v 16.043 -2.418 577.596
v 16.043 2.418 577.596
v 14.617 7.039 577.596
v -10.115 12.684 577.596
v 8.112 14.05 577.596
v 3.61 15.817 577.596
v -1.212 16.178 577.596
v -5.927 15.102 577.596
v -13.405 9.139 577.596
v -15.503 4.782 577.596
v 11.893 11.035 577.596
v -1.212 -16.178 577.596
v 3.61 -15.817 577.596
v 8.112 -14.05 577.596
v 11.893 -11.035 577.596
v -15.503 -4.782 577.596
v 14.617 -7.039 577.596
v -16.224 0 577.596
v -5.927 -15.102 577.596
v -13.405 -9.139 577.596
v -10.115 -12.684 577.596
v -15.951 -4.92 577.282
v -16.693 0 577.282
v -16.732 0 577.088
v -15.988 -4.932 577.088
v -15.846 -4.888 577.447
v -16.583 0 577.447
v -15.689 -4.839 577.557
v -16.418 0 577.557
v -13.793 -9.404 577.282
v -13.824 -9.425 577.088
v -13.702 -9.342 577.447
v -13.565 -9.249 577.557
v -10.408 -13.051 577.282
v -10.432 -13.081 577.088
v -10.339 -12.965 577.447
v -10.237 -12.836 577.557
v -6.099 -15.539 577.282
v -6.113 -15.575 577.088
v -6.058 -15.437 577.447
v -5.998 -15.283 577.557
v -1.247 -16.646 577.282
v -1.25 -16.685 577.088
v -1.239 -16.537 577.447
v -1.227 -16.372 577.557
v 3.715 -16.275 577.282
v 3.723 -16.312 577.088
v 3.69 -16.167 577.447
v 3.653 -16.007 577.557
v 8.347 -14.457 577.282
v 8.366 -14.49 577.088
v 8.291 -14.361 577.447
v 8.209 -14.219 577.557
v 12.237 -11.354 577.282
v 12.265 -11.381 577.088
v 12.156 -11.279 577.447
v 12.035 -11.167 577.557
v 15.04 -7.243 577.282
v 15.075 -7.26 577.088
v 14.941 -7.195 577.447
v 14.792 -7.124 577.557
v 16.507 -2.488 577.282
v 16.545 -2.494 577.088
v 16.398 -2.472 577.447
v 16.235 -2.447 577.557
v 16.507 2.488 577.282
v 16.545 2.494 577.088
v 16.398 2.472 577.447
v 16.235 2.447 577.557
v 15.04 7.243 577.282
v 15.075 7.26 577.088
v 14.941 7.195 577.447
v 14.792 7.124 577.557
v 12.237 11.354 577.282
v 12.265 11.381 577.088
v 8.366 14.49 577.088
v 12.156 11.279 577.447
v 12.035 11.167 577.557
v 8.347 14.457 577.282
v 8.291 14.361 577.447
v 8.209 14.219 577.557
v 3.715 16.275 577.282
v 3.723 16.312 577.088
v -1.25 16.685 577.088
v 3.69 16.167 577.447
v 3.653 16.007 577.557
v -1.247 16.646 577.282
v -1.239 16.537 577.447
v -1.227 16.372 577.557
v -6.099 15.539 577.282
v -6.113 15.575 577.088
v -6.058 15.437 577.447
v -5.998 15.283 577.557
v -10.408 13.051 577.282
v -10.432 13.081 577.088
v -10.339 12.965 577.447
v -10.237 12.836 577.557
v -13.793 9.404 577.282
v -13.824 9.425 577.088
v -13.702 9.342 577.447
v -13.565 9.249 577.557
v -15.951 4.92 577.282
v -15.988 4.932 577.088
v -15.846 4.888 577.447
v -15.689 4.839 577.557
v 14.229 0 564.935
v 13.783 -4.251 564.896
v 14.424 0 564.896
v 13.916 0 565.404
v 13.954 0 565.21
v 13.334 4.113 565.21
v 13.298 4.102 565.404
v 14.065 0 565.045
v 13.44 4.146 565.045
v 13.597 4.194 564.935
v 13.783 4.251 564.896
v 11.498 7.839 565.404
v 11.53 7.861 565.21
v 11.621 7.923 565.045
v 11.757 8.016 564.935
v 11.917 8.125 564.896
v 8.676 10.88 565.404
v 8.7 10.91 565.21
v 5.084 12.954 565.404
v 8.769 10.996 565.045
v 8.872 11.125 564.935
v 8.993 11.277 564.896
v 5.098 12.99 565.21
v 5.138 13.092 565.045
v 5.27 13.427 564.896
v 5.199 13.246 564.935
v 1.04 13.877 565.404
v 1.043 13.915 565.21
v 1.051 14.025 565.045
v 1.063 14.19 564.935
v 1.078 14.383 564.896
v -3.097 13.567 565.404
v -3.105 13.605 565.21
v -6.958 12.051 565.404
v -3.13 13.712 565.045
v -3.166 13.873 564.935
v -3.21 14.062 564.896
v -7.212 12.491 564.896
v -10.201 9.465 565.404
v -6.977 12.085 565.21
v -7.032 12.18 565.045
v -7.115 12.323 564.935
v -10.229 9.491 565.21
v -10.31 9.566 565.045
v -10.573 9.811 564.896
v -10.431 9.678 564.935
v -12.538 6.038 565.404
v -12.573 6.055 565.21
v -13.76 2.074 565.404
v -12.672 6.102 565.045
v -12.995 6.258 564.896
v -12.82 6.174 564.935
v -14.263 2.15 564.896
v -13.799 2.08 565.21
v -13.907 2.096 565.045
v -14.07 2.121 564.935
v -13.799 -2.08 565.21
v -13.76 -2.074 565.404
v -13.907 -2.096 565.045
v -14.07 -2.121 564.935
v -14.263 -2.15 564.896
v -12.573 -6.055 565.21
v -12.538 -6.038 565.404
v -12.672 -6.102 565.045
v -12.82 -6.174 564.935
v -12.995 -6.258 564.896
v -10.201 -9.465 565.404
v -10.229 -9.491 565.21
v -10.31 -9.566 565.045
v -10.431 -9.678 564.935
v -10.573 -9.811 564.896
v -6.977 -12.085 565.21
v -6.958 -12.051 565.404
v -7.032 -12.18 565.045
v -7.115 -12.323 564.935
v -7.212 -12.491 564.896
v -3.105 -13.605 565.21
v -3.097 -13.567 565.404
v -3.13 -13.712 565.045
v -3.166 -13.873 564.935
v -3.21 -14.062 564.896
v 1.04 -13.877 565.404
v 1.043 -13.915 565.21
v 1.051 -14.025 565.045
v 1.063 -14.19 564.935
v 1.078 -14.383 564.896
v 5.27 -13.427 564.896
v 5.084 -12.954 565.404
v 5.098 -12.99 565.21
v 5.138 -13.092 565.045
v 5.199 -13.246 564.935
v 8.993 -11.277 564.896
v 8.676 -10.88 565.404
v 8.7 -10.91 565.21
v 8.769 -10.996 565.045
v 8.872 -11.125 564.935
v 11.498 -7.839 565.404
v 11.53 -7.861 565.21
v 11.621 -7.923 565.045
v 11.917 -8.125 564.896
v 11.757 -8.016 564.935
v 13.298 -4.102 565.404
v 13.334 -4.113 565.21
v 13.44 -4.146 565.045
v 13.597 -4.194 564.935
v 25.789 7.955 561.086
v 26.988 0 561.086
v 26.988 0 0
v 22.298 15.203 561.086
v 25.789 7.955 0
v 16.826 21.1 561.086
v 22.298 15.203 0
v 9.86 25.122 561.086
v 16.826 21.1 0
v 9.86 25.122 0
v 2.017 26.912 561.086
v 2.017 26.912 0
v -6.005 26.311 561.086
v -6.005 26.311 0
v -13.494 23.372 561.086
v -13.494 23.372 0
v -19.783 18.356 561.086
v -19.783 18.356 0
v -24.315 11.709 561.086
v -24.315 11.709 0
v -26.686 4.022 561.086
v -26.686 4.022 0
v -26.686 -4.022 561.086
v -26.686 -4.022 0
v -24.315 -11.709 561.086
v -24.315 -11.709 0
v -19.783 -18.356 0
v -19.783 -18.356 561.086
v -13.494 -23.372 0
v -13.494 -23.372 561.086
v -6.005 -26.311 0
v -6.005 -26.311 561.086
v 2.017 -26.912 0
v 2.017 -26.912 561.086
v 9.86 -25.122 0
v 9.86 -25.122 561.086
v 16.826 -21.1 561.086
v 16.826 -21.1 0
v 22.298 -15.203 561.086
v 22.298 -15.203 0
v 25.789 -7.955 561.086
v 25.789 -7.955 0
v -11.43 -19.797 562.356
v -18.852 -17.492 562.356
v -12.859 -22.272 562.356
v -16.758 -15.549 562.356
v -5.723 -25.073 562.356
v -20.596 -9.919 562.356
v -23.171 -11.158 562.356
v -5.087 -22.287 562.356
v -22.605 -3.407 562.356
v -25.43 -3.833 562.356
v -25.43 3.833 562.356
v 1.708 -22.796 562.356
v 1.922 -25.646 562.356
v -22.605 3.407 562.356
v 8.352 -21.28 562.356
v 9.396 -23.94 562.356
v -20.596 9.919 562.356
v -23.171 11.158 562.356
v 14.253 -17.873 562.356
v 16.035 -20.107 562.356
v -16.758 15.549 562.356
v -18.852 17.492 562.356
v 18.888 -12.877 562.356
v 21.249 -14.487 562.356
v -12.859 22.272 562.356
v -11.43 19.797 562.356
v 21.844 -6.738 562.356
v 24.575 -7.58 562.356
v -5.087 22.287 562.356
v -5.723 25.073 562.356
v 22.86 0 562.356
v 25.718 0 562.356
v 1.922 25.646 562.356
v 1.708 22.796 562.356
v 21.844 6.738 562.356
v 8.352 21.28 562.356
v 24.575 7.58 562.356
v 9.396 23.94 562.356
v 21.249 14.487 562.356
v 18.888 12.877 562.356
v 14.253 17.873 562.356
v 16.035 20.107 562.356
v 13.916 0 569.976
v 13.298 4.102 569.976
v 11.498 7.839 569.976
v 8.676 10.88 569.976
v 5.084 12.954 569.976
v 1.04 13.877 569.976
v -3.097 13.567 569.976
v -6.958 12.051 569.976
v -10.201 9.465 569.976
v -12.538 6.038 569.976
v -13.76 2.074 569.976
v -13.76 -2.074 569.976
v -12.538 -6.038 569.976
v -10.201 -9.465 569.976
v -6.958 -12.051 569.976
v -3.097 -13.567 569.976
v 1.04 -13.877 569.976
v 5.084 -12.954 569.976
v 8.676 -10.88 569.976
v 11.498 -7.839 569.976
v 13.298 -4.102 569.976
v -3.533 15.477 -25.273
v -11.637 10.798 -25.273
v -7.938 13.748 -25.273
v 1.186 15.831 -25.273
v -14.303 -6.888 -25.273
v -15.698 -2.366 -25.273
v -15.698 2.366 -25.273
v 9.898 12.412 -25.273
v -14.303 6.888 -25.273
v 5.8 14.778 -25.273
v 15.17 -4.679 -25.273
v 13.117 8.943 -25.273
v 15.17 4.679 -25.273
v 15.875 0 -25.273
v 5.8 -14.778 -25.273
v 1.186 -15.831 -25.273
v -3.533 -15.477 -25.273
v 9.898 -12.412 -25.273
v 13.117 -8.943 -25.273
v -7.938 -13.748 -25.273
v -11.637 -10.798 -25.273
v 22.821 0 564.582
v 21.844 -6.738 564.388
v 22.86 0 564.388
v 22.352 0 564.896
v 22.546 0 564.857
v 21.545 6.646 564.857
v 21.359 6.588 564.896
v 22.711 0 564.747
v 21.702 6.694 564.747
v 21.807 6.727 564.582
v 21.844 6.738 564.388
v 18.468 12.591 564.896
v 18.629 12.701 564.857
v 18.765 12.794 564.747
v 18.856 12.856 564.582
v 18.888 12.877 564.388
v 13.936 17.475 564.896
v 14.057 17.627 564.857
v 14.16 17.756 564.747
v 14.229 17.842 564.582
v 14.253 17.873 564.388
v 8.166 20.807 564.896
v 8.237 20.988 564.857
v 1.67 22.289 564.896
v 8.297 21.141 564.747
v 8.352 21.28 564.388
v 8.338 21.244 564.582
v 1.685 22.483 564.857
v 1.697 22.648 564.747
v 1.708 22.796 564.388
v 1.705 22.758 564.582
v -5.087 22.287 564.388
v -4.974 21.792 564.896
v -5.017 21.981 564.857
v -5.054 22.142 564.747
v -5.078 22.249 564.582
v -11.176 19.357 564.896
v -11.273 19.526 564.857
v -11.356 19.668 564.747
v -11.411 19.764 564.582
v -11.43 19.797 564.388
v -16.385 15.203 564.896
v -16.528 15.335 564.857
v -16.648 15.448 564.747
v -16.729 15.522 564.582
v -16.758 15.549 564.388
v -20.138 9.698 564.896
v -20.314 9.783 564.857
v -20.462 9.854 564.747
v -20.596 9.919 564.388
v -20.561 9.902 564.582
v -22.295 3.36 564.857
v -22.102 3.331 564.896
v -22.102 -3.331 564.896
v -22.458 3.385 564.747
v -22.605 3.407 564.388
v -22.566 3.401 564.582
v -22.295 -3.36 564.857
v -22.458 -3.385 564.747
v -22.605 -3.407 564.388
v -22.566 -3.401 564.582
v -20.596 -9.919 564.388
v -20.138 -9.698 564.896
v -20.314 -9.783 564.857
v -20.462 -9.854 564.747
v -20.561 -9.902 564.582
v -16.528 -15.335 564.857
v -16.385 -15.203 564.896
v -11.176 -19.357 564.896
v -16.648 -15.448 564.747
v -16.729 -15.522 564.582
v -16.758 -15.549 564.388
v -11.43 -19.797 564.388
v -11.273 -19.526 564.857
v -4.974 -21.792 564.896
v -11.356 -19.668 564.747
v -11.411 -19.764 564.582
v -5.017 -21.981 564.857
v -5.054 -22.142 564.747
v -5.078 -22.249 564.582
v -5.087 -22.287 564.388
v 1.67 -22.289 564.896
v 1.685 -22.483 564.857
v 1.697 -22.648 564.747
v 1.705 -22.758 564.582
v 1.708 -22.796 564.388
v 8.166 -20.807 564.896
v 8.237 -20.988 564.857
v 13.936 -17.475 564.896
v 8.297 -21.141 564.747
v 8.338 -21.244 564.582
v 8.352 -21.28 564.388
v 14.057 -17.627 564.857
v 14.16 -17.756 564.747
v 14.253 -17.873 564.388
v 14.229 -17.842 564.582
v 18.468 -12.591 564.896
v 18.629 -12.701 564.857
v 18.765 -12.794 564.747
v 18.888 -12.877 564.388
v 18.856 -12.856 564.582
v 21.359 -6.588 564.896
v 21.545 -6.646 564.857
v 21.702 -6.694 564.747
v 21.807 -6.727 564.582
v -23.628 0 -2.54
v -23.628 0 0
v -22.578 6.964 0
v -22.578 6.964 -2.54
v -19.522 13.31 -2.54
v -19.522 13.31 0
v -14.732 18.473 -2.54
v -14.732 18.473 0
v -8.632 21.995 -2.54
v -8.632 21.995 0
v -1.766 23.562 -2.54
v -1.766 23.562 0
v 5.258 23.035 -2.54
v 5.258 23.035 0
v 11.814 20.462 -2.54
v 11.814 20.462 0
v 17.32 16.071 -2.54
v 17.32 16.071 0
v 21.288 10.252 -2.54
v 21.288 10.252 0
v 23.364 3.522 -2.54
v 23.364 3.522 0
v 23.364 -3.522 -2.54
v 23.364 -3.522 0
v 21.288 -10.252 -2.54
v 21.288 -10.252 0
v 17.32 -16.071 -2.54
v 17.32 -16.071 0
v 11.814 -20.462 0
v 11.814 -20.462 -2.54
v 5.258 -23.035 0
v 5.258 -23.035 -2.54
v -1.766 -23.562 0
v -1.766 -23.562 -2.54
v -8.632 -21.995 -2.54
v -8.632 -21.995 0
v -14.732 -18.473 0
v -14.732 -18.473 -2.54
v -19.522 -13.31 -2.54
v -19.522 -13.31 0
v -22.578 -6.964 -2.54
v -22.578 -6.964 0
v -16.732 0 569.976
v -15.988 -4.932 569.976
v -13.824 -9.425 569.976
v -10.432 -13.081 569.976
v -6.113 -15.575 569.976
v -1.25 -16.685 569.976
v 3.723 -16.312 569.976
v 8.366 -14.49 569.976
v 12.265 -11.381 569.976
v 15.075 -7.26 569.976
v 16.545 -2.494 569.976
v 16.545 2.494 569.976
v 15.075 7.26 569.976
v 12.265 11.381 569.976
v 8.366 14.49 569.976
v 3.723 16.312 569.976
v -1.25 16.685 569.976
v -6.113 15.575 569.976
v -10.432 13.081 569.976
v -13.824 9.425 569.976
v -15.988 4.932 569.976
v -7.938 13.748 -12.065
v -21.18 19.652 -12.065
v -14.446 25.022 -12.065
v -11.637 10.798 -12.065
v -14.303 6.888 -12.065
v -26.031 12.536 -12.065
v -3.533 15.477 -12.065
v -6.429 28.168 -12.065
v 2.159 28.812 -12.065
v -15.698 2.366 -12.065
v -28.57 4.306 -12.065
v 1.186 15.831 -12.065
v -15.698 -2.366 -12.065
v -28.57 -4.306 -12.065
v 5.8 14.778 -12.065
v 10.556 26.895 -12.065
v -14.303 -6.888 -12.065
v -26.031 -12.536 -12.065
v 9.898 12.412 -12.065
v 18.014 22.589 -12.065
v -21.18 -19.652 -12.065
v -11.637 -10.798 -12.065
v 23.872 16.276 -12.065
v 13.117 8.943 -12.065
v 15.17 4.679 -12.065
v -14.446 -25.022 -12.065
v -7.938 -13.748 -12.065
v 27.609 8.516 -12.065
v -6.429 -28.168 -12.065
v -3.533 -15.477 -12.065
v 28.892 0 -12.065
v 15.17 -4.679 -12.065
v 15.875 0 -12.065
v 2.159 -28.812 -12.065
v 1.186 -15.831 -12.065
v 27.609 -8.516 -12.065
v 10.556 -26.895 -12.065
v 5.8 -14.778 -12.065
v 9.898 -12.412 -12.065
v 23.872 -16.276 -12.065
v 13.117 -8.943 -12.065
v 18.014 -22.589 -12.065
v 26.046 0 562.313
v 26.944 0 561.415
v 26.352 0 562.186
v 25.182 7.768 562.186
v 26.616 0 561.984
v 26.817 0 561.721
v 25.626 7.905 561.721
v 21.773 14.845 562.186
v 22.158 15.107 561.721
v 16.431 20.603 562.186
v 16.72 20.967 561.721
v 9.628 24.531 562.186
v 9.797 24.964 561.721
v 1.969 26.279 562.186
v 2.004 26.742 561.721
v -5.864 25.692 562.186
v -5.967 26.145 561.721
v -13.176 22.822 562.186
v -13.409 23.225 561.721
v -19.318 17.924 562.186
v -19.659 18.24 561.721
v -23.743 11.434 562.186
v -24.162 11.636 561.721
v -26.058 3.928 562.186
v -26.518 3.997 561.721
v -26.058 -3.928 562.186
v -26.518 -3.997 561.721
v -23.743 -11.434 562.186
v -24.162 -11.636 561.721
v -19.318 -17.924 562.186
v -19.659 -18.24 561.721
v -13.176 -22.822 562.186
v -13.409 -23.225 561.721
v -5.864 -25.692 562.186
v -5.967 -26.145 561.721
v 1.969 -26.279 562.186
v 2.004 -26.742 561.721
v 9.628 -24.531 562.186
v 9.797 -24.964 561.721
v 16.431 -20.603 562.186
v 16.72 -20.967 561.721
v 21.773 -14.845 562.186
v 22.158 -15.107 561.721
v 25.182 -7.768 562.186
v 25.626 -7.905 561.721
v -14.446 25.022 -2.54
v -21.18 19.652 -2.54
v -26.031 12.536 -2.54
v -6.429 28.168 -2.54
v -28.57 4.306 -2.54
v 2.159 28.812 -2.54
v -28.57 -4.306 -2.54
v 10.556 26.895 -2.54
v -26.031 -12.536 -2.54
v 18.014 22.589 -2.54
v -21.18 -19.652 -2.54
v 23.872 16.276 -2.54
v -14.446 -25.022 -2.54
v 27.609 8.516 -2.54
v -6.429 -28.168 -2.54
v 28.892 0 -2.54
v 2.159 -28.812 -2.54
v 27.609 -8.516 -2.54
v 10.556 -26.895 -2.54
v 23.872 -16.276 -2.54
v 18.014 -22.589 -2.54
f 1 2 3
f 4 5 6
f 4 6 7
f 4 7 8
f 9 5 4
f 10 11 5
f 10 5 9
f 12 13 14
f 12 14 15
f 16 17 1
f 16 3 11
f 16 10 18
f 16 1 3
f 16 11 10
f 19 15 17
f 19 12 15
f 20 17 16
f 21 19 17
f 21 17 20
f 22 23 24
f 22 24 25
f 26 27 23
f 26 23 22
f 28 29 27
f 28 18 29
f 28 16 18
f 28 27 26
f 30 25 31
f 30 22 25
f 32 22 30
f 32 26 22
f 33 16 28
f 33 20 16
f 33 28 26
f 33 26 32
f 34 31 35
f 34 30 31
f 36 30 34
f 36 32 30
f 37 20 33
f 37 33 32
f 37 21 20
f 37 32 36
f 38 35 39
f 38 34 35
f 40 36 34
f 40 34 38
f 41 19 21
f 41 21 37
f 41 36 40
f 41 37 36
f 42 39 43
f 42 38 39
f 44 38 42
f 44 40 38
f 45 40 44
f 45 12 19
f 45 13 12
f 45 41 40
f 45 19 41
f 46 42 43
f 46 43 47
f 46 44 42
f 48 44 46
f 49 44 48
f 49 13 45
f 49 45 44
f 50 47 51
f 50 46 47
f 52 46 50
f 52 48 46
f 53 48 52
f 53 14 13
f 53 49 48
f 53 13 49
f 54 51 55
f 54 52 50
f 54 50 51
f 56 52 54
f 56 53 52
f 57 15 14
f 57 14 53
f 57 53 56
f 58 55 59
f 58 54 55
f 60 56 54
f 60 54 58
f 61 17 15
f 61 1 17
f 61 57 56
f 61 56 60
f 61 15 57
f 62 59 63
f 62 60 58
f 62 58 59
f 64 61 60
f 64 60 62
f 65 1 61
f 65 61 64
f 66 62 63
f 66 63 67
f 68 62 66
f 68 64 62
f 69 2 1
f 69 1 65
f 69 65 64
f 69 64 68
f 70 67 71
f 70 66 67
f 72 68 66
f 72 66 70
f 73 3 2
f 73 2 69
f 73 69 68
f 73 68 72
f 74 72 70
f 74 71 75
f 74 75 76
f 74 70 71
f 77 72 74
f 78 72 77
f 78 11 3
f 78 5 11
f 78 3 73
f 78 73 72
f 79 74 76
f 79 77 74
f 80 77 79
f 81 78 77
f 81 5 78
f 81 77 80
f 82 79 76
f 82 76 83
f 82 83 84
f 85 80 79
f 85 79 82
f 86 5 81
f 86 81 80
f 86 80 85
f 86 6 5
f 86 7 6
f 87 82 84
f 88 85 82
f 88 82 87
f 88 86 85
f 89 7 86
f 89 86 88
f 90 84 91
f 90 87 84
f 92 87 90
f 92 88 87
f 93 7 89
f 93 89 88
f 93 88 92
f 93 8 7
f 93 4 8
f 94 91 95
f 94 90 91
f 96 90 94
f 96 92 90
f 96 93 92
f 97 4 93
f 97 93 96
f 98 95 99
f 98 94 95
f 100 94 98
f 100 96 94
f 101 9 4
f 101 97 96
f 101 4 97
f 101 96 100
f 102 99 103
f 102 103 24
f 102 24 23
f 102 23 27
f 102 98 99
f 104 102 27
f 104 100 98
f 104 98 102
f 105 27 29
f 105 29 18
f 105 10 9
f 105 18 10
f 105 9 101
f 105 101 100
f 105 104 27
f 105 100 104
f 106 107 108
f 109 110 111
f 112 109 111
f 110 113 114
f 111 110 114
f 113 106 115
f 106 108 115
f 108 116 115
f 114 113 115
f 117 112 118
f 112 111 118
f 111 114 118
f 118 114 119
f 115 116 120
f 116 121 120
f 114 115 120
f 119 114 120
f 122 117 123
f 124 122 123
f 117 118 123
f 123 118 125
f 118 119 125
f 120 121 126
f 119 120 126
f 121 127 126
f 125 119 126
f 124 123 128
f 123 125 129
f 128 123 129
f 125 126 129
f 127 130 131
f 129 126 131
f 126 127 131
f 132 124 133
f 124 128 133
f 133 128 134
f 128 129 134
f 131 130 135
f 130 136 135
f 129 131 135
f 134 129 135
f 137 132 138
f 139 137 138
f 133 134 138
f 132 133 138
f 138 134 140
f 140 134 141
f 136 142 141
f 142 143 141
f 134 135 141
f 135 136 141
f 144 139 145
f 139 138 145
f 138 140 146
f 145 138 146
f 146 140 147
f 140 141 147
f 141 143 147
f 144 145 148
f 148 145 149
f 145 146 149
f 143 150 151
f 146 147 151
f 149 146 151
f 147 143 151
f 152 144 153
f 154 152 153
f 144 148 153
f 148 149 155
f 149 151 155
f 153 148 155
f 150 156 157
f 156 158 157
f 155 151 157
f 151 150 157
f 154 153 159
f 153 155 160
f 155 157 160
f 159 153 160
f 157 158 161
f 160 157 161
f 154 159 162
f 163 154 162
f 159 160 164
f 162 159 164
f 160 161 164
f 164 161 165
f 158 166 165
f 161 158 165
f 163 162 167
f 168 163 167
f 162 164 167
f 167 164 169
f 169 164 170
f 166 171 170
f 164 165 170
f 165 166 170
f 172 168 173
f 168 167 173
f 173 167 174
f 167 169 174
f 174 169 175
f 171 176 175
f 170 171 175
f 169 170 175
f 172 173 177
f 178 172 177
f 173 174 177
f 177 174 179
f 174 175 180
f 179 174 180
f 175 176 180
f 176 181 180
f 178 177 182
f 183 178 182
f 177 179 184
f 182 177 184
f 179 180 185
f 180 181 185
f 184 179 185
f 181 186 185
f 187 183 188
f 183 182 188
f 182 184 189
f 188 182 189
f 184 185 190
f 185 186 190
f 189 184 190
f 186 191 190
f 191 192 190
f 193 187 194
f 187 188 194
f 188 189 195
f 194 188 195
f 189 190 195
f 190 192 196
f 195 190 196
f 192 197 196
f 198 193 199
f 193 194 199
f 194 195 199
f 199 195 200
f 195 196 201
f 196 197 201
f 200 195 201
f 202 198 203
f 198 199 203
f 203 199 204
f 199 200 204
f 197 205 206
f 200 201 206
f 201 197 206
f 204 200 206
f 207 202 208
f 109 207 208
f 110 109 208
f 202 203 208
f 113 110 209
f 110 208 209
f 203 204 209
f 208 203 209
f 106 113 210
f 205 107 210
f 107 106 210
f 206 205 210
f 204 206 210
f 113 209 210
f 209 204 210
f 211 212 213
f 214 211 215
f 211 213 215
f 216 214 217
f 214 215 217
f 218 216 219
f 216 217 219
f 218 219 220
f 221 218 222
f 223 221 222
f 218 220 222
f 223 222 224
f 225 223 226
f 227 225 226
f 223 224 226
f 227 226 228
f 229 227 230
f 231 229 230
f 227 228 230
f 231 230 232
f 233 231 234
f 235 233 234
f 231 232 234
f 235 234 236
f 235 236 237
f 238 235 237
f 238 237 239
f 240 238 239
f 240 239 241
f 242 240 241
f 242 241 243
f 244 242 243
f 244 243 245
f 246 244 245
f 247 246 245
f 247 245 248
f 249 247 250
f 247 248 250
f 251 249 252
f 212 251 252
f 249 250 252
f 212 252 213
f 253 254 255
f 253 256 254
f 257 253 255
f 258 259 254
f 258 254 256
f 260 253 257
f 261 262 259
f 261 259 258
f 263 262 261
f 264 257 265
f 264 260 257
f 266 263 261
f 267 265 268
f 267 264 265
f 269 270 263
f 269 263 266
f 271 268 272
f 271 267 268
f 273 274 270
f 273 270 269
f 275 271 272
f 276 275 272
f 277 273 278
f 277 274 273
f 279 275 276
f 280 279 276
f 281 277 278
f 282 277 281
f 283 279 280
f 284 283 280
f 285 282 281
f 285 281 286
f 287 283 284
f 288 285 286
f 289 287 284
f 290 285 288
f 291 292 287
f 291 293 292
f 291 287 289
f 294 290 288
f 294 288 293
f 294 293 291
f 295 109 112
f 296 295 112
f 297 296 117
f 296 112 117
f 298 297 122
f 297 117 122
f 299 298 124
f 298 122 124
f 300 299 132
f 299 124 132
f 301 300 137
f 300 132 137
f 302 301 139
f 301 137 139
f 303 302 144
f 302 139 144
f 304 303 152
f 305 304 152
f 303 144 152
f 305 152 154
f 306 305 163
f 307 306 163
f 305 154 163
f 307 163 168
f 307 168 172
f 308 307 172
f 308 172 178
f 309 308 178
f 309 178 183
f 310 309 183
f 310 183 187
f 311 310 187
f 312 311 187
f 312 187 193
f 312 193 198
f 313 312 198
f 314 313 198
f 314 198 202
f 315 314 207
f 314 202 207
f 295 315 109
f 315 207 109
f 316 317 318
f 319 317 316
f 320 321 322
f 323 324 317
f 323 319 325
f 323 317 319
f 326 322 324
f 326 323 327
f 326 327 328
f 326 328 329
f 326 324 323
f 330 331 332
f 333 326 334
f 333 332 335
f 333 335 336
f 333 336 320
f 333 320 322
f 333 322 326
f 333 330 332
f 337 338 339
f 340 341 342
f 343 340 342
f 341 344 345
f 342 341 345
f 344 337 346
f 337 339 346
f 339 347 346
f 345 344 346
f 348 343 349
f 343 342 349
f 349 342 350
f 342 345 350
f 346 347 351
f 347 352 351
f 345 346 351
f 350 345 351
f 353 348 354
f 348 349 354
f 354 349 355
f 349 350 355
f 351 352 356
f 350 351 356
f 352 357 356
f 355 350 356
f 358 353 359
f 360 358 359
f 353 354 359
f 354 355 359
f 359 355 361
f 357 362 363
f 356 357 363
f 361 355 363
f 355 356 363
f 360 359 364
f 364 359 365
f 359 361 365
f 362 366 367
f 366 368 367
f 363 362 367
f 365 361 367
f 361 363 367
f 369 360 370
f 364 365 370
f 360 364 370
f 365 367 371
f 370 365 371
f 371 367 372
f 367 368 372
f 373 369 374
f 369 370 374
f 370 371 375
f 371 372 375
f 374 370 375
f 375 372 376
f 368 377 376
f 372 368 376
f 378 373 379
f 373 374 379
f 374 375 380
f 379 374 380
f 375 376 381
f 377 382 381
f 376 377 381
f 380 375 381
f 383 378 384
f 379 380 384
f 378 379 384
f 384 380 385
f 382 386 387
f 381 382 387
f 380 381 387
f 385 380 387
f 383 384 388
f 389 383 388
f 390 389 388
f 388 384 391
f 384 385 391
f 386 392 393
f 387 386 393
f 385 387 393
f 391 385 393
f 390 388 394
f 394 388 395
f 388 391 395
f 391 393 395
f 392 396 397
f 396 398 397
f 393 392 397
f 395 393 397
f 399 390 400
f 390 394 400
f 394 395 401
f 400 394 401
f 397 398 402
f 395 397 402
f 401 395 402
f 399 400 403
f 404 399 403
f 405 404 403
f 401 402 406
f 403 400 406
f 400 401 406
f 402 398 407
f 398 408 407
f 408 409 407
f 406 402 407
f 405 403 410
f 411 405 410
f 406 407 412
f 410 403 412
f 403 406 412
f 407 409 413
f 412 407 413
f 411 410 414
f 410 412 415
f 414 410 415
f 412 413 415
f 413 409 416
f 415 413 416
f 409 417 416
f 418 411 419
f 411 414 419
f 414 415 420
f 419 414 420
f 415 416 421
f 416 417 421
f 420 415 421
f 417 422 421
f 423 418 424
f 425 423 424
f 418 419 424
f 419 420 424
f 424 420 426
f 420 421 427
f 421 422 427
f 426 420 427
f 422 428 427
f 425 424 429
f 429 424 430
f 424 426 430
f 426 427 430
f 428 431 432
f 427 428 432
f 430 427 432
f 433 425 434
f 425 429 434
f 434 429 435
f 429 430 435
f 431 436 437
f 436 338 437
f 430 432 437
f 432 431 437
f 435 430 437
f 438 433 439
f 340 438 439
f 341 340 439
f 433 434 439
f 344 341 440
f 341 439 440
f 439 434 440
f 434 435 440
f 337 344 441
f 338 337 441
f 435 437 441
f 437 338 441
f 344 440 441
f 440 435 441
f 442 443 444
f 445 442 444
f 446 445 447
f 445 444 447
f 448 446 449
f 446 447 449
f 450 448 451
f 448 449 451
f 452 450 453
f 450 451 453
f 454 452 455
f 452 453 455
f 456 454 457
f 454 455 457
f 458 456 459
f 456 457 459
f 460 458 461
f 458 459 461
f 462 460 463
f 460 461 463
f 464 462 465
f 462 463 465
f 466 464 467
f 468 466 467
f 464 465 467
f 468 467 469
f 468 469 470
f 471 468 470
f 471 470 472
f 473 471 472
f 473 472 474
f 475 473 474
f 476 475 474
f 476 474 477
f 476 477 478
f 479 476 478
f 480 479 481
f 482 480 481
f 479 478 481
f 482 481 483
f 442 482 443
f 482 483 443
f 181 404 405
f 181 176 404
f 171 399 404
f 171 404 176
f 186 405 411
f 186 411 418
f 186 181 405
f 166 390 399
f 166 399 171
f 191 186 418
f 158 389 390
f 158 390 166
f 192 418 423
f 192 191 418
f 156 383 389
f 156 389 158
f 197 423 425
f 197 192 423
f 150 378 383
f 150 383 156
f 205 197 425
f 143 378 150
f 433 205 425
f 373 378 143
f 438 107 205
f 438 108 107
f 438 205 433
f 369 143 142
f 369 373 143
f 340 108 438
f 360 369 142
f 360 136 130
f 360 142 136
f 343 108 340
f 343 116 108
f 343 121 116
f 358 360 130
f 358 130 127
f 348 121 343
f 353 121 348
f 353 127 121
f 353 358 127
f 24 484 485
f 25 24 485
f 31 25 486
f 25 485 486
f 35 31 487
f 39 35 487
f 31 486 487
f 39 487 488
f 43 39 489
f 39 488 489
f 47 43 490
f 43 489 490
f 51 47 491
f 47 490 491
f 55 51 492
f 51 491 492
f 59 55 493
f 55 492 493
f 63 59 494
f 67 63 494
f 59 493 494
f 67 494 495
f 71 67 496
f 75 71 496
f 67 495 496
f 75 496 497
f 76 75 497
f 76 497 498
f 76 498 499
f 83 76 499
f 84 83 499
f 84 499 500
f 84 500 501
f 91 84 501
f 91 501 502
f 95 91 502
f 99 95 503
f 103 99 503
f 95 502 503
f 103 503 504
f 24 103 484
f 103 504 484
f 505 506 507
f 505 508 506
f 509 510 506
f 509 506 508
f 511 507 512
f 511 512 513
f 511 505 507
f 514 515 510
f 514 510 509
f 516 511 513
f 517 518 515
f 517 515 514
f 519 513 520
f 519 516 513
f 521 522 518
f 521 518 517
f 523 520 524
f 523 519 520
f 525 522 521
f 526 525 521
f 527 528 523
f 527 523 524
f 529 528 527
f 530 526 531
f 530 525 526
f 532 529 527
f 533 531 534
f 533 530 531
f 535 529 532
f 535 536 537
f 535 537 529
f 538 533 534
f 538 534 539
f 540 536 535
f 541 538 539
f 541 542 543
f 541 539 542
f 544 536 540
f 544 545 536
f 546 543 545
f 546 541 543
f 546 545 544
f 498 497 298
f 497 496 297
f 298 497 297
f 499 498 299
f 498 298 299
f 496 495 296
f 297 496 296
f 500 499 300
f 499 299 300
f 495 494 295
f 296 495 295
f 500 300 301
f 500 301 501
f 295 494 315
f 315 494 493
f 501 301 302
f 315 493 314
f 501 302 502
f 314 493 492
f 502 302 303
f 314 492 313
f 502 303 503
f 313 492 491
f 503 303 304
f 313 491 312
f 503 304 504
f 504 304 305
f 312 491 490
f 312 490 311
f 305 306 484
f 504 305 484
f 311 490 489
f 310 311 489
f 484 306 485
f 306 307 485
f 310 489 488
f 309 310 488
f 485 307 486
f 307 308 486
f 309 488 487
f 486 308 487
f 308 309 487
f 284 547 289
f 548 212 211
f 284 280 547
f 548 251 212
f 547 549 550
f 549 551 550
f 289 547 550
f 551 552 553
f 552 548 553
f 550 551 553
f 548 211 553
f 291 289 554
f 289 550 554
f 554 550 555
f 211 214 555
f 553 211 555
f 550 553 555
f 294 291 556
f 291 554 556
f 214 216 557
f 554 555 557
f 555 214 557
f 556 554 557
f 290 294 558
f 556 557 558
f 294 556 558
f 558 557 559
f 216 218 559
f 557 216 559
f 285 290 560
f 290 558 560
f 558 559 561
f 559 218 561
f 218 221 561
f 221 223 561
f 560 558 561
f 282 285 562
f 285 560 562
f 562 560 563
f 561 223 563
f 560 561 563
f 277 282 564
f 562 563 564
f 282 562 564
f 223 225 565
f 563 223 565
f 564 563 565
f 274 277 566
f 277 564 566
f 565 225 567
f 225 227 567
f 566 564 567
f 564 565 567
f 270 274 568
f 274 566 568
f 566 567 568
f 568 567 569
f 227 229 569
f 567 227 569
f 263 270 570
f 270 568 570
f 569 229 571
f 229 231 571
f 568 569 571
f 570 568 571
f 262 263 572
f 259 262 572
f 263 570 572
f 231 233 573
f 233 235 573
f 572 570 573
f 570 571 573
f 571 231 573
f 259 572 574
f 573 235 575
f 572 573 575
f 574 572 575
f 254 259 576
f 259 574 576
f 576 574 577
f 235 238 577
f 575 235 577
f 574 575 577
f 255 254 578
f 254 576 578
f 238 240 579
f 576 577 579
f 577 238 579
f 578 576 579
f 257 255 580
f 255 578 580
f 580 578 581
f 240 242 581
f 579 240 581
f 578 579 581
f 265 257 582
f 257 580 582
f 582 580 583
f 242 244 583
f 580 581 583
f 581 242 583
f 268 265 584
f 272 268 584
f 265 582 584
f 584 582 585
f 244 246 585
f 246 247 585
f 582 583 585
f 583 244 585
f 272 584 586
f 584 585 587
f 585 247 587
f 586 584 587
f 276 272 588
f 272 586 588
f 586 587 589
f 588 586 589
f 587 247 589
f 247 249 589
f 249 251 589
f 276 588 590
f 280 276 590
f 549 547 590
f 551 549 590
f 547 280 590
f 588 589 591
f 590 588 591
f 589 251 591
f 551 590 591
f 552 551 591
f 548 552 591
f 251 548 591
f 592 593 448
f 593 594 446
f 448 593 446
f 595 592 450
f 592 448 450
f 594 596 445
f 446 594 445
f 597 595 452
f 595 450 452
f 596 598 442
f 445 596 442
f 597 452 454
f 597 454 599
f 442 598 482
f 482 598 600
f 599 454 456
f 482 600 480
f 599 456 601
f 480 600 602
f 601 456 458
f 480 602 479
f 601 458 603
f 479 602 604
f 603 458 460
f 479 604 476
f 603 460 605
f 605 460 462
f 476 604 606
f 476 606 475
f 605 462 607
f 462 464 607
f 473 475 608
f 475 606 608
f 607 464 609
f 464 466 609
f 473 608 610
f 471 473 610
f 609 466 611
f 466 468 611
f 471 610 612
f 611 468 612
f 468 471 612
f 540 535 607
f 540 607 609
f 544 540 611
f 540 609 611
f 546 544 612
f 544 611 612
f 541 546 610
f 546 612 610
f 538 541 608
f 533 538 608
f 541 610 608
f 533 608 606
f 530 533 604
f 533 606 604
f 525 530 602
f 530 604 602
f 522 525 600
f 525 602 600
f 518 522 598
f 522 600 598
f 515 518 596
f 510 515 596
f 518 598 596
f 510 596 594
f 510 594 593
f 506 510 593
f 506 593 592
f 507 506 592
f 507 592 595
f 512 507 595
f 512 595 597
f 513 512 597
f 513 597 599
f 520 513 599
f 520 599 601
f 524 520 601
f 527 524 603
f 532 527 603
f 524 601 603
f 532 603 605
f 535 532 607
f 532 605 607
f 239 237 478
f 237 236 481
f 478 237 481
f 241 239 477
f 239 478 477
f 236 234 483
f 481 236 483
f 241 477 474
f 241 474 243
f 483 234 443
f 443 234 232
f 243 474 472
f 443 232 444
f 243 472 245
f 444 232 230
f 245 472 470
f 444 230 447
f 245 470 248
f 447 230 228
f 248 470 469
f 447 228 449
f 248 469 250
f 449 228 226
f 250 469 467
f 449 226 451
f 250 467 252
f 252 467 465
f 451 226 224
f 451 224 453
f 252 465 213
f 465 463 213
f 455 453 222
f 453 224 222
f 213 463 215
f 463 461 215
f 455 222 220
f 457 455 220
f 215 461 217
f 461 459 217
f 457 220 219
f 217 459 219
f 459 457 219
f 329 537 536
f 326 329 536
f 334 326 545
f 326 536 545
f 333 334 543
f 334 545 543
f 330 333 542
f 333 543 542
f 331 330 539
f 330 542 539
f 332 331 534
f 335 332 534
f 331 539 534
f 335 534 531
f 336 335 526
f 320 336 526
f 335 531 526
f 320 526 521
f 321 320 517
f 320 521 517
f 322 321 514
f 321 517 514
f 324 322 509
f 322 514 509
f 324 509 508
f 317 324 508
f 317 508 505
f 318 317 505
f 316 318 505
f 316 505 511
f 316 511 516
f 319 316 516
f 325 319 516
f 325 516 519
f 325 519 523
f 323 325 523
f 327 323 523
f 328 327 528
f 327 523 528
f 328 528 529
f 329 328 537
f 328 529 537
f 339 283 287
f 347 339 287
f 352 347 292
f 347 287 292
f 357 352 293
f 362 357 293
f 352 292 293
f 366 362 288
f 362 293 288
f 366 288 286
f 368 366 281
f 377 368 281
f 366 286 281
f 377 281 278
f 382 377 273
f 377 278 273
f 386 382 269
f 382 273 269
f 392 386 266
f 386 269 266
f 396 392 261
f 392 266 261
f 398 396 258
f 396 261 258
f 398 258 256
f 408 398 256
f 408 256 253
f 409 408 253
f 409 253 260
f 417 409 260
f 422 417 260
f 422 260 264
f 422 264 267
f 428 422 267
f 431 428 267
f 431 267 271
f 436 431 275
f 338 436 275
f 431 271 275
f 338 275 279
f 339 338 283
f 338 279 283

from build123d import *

# Parameters (mm, degrees)
SKETCH1_R           = 26.9875
BOSS_EXTRUDE1_DEPTH = 562.356
SKETCH2_R           = 22.86
BOSS_EXTRUDE2_DEPTH = 2.54
SKETCH3_R           = 13.915766971
BOSS_EXTRUDE3_DEPTH = 5.08
SKETCH4_R           = 16.731786723
BOSS_EXTRUDE4_DEPTH = 7.62
FILLET1_R           = 0.508
FILLET2_R           = 0.508
FILLET3_R           = 0.508
FILLET4_R           = 1.27
SKETCH5_R           = 23.627835933
BOSS_EXTRUDE5_DEPTH = 2.54
SKETCH6_R           = 28.8925
BOSS_EXTRUDE6_DEPTH = 9.525
SKETCH7_R           = 15.875
BOSS_EXTRUDE7_DEPTH = 13.208


with BuildPart() as part:
    # Sketch1 → Boss-Extrude1 (new body)
    with BuildSketch(Plane.XY):
        Circle(SKETCH1_R)
    extrude(amount=BOSS_EXTRUDE1_DEPTH)

    # Sketch2 → Boss-Extrude2 (add)
    with BuildSketch(Plane.XY.offset(562.356)):
        Circle(SKETCH2_R)
    extrude(amount=BOSS_EXTRUDE2_DEPTH)

    # Sketch3 → Boss-Extrude3 (add)
    with BuildSketch(Plane.XY.offset(564.896)):
        Circle(SKETCH3_R)
    extrude(amount=BOSS_EXTRUDE3_DEPTH)

    # Sketch4 → Boss-Extrude4 (add)
    with BuildSketch(Plane.XY.offset(569.976)):
        with Locations(Location((0, 0, 0), (0, 0, 180))):
            Circle(SKETCH4_R)
    extrude(amount=BOSS_EXTRUDE4_DEPTH)

    # Fillet1
    fillet1_edges = [part.edges().sort_by_distance(p)[0] for p in [
        (16.731786723, 0, 577.596),
    ]]
    fillet(fillet1_edges, radius=FILLET1_R)

    # Fillet2
    fillet2_edges = [part.edges().sort_by_distance(p)[0] for p in [
        (-13.915766971, 0, 564.896),
    ]]
    fillet(fillet2_edges, radius=FILLET2_R)

    # Fillet3
    fillet3_edges = [part.edges().sort_by_distance(p)[0] for p in [
        (-22.86, 0, 564.896),
    ]]
    fillet(fillet3_edges, radius=FILLET3_R)

    # Fillet4
    fillet4_edges = [part.edges().sort_by_distance(p)[0] for p in [
        (-26.9875, 0, 562.356),
    ]]
    fillet(fillet4_edges, radius=FILLET4_R)

    # Sketch5 → Boss-Extrude5 (add)
    with BuildSketch(Plane(origin=(0, 0, 0), x_dir=(-1, 0, 0), z_dir=(0, 0, -1))):
        Circle(SKETCH5_R)
    extrude(amount=BOSS_EXTRUDE5_DEPTH)

    # Sketch6 → Boss-Extrude6 (add)
    with BuildSketch(Plane(origin=(0, 0, -2.54), x_dir=(-1, 0, 0), z_dir=(0, 0, -1))):
        with Locations(Location((0, 0, 0), (0, 0, 180))):
            Circle(SKETCH6_R)
    extrude(amount=BOSS_EXTRUDE6_DEPTH)

    # Sketch7 → Boss-Extrude7 (add)
    with BuildSketch(Plane(origin=(0, 0, -12.065), x_dir=(-1, 0, 0), z_dir=(0, 0, -1))):
        with Locations(Location((0, 0, 0), (0, 0, 180))):
            Circle(SKETCH7_R)
    extrude(amount=BOSS_EXTRUDE7_DEPTH)


solid = part.part
